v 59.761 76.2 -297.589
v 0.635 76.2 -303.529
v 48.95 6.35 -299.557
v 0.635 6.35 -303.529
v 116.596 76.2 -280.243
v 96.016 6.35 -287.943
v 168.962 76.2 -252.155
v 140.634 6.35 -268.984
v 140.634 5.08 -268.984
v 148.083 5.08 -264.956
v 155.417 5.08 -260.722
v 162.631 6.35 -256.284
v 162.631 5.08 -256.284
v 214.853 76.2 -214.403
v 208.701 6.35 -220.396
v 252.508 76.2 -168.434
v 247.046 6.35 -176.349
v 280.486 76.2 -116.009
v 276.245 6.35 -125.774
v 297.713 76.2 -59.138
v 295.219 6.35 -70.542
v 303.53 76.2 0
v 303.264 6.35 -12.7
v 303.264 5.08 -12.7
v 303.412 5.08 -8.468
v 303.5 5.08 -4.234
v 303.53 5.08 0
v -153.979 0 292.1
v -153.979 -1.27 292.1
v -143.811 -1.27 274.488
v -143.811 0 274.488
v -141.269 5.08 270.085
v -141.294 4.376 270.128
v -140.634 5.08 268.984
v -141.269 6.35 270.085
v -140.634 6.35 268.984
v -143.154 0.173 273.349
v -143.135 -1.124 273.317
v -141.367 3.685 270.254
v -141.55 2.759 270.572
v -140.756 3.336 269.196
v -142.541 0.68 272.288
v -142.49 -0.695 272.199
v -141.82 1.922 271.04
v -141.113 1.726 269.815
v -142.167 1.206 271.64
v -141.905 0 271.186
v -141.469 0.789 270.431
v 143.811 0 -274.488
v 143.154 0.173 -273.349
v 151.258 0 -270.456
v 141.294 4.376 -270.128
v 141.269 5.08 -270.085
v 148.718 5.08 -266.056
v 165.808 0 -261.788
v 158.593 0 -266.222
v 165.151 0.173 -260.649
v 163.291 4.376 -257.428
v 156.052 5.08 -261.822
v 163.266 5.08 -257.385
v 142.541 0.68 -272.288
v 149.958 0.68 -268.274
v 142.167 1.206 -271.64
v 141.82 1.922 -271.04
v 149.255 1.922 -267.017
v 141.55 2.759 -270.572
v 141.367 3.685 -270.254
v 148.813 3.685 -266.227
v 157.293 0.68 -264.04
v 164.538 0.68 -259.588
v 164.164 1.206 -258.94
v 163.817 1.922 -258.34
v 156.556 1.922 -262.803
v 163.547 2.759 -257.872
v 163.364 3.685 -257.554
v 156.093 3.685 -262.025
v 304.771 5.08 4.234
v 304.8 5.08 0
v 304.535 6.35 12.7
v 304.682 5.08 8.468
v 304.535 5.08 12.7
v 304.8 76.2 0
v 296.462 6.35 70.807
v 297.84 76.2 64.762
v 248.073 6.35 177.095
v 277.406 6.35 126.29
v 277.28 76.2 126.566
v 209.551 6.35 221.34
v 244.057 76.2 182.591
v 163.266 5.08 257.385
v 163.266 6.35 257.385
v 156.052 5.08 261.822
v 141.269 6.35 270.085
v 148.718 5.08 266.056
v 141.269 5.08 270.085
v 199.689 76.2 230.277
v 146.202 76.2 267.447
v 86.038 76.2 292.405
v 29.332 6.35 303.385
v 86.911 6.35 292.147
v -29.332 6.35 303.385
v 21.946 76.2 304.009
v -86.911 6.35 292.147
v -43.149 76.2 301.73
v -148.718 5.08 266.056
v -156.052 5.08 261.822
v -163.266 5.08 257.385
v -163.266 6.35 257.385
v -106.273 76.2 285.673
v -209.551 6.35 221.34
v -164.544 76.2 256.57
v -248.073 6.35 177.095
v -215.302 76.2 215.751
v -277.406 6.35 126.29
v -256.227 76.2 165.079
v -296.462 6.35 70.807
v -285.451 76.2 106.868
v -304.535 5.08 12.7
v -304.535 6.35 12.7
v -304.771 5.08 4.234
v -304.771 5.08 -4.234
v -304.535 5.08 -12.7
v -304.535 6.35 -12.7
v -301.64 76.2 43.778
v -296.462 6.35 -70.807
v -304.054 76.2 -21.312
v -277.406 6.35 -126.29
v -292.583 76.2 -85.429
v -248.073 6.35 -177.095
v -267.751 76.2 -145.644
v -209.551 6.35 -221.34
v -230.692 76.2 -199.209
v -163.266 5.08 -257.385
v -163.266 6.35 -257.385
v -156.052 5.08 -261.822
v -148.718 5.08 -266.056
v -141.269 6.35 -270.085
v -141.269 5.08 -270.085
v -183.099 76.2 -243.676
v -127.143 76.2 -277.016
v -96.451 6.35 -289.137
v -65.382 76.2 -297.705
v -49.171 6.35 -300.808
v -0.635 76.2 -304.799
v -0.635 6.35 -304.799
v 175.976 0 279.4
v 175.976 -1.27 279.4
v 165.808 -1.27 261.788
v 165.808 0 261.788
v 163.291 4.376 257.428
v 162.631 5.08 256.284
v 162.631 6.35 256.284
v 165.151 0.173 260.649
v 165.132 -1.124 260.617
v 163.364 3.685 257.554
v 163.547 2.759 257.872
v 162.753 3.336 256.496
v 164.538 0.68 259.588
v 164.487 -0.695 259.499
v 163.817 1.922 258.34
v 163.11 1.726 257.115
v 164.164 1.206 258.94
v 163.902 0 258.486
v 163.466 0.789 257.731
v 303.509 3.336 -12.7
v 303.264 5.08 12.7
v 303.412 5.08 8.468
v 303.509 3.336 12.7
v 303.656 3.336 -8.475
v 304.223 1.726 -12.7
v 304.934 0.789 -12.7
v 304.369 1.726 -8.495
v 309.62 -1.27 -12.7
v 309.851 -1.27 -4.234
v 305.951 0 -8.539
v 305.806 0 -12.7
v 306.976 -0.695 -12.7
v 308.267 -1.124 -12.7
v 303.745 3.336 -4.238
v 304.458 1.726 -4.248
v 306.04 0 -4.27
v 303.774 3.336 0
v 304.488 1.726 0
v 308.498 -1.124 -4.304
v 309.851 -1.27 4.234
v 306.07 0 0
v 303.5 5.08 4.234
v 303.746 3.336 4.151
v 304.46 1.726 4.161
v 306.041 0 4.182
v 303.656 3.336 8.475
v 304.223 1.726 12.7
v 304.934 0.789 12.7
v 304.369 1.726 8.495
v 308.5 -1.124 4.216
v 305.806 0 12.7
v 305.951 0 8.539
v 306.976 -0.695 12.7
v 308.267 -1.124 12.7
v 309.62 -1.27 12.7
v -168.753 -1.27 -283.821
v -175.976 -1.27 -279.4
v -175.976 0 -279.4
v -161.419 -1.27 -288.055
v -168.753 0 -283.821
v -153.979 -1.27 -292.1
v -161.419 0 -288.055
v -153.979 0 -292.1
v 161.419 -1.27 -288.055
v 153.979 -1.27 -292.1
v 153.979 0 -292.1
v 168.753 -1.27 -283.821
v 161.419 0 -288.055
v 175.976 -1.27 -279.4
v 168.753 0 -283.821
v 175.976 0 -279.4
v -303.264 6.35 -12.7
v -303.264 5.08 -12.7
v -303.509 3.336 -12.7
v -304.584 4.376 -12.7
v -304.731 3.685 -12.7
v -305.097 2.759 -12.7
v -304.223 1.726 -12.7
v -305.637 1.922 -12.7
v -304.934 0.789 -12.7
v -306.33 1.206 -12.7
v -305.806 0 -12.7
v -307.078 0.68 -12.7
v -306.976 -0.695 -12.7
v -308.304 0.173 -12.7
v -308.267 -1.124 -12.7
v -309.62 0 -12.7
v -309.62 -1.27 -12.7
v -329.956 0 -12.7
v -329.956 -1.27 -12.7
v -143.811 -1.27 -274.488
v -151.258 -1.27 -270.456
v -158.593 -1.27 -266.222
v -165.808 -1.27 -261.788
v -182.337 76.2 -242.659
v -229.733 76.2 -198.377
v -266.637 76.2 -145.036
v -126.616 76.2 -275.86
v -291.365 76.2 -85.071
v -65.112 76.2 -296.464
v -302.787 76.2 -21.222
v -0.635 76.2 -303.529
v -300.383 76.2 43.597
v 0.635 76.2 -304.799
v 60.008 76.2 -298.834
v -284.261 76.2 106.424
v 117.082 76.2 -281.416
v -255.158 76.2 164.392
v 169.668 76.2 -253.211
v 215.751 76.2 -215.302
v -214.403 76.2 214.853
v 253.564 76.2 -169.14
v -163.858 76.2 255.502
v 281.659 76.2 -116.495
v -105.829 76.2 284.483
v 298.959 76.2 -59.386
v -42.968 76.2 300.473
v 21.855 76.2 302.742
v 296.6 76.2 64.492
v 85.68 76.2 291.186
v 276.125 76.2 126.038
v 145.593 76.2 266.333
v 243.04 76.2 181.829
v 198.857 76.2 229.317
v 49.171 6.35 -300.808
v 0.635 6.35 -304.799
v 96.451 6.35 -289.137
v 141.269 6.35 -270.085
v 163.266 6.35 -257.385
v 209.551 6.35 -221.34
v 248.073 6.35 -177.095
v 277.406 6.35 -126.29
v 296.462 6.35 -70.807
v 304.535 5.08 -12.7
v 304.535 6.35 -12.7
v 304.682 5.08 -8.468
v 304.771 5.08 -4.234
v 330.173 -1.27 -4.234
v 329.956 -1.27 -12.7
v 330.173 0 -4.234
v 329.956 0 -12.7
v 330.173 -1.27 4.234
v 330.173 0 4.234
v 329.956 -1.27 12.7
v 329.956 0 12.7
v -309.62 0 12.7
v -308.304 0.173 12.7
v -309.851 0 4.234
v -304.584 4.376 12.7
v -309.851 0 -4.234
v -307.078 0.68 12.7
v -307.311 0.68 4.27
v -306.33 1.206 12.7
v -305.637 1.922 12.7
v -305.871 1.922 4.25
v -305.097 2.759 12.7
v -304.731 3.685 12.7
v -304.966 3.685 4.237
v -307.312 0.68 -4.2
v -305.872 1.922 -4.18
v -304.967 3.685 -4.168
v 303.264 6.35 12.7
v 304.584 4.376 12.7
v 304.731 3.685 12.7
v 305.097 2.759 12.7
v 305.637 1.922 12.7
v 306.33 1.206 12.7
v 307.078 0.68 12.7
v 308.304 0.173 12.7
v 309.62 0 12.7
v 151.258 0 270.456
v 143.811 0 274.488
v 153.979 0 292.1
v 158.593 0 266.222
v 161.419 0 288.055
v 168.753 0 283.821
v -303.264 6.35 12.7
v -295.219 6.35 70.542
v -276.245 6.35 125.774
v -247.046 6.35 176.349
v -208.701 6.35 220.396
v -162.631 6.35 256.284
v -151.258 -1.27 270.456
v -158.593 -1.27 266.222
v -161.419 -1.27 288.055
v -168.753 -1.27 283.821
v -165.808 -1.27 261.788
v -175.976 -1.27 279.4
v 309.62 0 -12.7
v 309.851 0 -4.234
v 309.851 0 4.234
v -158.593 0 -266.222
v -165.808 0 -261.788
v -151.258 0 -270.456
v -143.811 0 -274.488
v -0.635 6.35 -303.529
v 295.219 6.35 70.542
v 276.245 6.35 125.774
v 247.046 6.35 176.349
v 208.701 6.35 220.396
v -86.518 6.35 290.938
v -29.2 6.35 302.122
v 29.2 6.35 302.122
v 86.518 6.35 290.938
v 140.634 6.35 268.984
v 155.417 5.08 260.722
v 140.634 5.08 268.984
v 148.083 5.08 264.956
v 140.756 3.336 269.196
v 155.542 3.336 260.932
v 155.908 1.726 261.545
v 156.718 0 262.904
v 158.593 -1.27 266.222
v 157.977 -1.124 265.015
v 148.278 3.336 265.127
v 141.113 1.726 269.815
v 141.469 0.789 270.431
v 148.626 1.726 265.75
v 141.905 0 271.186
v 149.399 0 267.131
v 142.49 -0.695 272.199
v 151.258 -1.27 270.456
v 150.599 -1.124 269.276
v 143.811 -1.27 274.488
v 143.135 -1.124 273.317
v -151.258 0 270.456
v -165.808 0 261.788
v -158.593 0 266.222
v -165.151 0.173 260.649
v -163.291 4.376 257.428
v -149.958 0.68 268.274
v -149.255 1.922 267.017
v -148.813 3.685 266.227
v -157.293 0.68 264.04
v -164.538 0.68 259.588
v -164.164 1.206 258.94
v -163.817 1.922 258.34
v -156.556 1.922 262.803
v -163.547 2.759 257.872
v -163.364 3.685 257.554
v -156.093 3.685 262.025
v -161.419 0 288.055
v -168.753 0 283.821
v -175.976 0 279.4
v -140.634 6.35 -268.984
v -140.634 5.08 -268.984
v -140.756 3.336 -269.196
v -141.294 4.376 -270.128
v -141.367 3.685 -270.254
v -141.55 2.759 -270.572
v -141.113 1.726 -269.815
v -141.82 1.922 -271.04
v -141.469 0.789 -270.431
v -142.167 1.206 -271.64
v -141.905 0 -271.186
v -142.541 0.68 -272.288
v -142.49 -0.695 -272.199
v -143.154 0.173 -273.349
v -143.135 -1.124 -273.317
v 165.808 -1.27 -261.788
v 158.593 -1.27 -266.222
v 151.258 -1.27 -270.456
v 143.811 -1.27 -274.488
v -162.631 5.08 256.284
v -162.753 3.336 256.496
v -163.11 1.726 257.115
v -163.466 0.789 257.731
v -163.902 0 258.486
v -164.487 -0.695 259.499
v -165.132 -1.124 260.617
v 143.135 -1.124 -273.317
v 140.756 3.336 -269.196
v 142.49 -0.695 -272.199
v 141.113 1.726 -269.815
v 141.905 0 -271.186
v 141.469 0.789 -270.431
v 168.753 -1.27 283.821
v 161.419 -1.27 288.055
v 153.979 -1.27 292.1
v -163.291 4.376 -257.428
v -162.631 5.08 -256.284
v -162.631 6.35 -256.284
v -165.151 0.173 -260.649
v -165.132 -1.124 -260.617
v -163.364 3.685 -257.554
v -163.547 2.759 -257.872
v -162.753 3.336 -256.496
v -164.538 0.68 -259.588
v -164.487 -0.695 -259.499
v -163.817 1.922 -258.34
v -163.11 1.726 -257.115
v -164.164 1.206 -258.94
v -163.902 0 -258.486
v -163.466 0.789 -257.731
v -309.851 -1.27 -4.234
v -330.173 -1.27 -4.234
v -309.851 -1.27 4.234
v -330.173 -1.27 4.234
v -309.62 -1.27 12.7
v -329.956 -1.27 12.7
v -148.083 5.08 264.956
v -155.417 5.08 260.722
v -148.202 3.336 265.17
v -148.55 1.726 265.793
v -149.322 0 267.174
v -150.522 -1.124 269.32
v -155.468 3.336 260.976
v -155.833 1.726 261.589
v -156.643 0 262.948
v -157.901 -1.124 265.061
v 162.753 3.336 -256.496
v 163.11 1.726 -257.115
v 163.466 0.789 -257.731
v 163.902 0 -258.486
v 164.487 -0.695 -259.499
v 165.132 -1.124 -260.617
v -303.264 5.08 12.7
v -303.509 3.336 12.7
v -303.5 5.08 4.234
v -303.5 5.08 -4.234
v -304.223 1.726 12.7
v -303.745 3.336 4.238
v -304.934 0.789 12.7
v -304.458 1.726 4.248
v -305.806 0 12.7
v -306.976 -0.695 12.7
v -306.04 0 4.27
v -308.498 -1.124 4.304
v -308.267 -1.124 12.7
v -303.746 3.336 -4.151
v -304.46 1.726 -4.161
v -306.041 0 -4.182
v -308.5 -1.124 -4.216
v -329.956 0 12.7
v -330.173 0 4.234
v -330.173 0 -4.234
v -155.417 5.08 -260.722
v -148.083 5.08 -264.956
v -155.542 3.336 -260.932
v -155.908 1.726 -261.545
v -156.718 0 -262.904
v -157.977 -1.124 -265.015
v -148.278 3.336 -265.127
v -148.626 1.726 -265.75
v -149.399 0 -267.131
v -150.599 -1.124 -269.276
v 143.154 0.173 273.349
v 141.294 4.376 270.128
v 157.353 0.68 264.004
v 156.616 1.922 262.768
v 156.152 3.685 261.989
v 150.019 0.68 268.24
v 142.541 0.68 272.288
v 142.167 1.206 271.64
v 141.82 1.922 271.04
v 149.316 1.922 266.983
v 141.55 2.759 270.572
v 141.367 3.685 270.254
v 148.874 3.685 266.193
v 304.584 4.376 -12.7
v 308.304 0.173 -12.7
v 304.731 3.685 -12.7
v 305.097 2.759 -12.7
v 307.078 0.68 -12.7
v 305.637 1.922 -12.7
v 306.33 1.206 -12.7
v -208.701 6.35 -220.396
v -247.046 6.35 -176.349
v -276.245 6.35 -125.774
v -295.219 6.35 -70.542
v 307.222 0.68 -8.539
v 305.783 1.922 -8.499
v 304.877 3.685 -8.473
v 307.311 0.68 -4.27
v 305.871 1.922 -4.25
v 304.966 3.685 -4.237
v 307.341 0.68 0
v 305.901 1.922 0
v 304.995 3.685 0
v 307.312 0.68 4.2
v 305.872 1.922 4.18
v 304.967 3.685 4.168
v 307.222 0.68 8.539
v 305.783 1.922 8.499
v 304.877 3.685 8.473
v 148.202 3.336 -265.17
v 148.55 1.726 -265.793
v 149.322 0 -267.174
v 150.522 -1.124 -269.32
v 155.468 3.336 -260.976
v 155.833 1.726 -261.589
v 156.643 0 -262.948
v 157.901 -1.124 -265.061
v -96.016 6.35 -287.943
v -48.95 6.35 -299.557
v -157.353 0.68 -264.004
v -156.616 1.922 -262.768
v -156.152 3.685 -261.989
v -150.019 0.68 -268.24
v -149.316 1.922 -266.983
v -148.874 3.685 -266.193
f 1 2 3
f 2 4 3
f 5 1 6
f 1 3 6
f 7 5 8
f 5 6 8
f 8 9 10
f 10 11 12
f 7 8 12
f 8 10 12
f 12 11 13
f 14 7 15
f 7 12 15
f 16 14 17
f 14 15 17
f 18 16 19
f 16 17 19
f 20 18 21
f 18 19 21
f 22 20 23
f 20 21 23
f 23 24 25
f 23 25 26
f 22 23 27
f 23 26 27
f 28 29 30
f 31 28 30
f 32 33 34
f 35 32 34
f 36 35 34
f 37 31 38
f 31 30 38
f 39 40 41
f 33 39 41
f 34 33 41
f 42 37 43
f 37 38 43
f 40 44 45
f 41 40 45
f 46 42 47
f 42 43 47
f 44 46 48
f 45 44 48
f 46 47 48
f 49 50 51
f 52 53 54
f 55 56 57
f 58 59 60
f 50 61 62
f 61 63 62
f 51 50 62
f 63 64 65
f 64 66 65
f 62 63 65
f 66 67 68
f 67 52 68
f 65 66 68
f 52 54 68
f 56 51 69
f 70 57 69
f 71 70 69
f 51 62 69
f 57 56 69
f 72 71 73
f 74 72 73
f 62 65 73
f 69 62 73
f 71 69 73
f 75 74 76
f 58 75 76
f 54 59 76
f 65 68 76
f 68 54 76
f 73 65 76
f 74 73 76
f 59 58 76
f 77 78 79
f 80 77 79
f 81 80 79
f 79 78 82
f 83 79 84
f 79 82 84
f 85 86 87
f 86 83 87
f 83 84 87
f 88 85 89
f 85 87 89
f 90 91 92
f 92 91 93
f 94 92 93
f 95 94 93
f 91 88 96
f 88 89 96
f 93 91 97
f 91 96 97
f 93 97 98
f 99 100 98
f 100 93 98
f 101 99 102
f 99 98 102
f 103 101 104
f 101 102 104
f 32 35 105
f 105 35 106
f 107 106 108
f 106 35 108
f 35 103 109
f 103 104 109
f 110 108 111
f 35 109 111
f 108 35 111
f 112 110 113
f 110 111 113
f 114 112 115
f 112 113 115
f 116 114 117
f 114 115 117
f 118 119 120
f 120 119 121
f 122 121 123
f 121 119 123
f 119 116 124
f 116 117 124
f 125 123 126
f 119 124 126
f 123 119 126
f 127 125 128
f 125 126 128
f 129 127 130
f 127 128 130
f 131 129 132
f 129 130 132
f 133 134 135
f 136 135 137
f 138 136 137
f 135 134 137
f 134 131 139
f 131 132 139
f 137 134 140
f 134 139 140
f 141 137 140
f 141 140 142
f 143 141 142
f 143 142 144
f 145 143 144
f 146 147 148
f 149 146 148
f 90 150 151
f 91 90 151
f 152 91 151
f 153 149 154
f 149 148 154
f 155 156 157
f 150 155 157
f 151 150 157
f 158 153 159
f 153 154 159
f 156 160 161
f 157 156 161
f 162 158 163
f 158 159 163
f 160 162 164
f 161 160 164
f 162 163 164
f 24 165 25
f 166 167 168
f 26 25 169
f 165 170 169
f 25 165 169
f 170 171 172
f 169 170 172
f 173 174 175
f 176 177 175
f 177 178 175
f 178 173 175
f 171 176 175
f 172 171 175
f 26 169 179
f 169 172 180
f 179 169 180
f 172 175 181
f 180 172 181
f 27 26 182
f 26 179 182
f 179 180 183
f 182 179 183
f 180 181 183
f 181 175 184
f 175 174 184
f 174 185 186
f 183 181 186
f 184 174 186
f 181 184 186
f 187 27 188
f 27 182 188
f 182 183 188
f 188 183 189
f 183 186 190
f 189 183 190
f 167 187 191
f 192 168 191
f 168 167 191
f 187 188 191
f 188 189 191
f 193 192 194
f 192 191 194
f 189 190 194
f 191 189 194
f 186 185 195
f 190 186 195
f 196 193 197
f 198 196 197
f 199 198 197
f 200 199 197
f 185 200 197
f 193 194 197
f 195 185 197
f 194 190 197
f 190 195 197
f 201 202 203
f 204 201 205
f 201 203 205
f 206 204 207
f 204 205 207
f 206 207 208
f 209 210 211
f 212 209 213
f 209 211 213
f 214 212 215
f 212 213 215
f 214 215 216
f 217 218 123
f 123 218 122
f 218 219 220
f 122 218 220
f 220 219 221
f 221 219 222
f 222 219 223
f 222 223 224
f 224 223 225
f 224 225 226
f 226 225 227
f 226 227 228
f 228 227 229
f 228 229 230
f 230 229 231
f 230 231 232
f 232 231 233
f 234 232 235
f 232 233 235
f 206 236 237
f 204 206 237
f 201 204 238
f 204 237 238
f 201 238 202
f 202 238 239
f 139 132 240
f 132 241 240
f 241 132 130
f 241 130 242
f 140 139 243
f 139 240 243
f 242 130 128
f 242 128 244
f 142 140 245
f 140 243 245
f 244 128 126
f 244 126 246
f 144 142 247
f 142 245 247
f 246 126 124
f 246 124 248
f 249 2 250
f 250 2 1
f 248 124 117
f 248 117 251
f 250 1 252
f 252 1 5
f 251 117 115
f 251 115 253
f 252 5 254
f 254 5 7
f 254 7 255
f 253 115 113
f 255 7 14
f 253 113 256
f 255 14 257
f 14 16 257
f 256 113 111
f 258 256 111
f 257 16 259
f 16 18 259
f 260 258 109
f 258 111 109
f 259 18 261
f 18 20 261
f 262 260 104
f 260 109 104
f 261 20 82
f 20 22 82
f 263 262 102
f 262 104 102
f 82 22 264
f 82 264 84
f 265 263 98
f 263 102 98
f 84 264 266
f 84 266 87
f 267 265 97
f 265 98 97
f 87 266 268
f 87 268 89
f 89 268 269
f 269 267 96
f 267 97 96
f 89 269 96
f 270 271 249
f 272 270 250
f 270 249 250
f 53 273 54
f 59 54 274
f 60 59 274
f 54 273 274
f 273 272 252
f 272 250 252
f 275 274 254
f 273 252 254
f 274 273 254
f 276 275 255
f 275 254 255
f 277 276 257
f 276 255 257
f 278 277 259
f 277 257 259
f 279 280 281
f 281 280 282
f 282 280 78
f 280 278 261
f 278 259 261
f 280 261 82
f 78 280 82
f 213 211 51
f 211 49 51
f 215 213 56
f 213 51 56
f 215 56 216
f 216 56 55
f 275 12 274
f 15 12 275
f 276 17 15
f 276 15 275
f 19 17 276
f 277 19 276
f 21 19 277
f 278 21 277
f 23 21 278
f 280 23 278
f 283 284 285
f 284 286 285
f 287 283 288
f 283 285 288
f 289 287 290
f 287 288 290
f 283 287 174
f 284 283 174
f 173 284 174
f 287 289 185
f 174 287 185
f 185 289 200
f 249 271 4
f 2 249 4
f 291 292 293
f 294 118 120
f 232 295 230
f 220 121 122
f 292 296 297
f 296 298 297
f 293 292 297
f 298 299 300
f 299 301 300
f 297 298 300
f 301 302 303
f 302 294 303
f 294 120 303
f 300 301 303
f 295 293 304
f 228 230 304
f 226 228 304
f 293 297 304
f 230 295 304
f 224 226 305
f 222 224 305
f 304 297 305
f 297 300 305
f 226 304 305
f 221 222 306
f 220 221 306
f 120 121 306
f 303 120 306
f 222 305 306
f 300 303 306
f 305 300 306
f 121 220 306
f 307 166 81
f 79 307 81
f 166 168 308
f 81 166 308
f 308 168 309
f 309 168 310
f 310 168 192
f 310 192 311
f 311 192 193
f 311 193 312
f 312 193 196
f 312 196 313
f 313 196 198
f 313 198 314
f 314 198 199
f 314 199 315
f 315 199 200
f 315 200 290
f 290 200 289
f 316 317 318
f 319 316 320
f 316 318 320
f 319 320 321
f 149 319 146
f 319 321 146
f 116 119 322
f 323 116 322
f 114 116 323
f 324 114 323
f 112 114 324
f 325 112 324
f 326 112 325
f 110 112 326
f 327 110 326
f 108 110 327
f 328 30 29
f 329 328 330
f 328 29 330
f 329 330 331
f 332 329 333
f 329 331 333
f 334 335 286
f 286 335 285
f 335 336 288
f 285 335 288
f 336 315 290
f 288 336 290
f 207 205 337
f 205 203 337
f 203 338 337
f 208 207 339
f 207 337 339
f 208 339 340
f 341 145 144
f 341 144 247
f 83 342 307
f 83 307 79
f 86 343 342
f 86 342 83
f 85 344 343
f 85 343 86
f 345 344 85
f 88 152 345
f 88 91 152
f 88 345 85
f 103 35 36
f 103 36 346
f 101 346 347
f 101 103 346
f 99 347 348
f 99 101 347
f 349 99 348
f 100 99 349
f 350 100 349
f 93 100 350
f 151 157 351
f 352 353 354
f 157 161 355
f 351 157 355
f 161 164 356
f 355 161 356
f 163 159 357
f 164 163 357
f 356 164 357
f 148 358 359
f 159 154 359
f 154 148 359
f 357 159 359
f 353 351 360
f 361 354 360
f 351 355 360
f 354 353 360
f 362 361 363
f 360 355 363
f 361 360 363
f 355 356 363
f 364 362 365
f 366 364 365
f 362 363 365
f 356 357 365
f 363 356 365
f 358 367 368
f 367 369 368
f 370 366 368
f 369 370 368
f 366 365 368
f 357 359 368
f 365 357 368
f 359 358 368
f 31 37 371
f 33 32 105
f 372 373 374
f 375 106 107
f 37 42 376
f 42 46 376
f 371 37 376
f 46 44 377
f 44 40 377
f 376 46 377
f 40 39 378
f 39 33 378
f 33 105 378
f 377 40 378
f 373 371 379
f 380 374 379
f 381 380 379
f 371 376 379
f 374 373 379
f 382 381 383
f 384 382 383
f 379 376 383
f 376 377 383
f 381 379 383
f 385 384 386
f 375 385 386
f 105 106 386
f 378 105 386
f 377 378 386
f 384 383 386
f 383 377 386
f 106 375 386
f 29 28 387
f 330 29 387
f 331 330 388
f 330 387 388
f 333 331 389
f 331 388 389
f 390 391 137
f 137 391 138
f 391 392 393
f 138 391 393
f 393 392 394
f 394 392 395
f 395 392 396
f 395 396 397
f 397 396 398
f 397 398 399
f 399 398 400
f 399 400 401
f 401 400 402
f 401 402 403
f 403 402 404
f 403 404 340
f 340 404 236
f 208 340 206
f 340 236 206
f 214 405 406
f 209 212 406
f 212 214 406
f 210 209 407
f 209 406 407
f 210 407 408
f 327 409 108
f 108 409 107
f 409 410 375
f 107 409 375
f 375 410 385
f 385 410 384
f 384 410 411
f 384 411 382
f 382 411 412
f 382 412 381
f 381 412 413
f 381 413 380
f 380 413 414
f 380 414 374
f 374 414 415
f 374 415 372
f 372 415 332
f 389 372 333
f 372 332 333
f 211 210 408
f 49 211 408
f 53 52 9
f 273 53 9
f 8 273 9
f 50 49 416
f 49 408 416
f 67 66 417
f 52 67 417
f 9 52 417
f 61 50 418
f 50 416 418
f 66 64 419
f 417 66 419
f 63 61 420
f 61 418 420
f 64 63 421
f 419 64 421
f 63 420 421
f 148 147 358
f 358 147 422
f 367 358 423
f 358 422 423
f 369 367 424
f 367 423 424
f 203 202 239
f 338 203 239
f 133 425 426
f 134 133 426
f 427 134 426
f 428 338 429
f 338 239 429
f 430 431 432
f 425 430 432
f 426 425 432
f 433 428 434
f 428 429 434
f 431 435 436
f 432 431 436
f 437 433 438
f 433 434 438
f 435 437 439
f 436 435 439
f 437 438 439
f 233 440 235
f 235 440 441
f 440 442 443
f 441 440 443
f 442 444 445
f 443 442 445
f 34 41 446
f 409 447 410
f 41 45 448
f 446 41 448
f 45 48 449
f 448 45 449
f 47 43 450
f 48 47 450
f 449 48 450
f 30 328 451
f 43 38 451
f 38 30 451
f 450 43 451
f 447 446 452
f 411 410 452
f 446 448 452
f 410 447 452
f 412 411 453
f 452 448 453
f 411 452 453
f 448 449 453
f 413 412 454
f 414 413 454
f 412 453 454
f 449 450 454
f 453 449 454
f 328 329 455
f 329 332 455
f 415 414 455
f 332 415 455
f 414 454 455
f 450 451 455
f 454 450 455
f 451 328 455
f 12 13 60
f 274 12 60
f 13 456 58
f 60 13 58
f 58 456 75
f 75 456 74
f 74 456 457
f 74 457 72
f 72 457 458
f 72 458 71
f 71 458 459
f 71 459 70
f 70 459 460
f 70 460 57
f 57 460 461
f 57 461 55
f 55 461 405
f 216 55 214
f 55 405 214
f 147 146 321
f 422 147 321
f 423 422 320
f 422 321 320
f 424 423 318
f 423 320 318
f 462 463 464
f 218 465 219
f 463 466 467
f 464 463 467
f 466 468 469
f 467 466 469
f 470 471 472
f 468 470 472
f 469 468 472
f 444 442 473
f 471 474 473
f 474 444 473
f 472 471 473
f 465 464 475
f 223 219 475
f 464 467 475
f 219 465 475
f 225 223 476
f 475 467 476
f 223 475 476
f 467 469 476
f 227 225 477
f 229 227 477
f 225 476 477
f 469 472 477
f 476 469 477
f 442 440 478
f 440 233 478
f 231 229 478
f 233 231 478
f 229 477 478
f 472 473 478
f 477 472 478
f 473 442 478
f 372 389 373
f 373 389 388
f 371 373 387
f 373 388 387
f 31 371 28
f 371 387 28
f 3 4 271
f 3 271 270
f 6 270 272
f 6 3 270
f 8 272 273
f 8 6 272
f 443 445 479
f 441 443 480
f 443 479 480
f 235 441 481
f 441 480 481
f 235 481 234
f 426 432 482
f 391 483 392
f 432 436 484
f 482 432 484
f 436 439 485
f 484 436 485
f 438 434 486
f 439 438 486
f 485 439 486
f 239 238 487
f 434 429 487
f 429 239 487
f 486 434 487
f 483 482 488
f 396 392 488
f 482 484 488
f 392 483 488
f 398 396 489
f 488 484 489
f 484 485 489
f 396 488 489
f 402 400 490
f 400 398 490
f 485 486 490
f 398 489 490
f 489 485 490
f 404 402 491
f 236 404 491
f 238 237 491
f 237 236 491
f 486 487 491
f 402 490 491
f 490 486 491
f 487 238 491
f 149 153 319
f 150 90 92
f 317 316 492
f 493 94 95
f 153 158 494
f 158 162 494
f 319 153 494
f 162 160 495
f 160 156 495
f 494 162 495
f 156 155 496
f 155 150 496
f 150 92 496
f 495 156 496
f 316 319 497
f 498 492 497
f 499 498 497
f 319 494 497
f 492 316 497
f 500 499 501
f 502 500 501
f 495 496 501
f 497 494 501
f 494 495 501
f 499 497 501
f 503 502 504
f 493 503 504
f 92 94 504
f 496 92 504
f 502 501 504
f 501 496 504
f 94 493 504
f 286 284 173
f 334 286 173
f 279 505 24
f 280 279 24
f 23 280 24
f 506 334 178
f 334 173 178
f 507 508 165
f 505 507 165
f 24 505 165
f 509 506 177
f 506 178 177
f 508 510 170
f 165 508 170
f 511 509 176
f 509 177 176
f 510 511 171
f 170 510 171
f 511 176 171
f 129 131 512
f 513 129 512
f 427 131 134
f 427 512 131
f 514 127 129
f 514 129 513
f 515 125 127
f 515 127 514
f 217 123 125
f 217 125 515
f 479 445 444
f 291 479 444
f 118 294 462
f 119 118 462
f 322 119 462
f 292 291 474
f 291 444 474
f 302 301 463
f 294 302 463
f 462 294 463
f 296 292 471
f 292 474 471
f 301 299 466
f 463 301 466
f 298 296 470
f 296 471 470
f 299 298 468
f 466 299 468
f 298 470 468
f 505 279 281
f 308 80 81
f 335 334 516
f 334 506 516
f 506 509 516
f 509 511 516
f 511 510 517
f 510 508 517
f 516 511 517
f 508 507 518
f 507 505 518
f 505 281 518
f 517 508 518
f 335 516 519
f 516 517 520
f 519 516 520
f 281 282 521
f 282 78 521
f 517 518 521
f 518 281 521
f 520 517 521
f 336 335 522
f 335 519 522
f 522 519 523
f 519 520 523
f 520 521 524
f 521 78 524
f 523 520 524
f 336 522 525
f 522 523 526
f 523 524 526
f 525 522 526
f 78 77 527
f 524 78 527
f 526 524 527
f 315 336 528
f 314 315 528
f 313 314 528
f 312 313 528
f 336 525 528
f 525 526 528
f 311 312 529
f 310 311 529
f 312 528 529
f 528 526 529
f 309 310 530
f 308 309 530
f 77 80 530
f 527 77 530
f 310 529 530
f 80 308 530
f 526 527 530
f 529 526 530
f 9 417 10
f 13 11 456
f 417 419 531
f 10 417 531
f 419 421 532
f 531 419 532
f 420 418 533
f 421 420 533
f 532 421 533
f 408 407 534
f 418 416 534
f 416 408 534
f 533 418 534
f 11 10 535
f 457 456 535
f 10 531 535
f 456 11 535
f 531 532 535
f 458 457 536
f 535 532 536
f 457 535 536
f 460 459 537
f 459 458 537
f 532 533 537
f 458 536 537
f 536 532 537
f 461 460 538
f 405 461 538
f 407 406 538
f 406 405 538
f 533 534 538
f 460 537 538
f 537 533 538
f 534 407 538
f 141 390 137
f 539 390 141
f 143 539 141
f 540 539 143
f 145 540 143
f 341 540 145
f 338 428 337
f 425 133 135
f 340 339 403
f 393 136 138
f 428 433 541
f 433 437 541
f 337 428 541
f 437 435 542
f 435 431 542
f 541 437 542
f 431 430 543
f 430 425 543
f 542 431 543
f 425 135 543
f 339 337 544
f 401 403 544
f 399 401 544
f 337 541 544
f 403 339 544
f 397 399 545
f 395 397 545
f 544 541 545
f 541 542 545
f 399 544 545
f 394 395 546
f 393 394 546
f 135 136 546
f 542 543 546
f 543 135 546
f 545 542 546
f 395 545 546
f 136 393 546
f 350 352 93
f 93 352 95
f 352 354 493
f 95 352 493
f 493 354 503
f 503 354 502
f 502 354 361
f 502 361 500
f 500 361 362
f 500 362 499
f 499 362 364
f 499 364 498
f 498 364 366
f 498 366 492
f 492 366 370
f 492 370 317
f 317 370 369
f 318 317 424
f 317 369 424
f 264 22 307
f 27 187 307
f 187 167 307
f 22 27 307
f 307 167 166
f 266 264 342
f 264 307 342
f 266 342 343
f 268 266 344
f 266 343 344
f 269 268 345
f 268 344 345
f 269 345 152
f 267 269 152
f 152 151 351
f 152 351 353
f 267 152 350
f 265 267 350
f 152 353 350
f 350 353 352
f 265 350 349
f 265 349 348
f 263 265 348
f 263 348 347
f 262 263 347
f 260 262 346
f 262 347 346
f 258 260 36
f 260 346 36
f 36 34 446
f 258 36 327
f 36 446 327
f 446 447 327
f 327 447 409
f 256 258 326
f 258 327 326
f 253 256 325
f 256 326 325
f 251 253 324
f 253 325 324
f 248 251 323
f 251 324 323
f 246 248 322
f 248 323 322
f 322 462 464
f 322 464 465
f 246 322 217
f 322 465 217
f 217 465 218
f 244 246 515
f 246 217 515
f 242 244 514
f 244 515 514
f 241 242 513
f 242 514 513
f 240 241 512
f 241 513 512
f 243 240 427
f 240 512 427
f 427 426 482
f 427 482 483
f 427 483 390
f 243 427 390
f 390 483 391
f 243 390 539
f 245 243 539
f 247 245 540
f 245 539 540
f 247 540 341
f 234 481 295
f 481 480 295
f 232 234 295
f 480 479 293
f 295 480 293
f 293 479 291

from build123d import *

# Parameters (mm, degrees)
F3_DEPTH      = 6.35
F3_DEPTH_BACK = 1.271
F4_W          = 1.27
F4_H          = 76.2
F5_DEPTH      = 76.201
F5_DEPTH_BACK = 1.2710001


with BuildPart() as f1:
    # F0 (on Top) → F1 (revolve)
    with BuildSketch(Plane.XY):
        with BuildLine():
            Line((304.8, 5.08), (304.8, 76.2))
            Line((304.8, 76.2), (303.53, 76.2))
            Line((303.53, 76.2), (303.53, 5.08))
            ThreePointArc((303.53, 5.08), (305.3898719395, 0.5898719395), (309.88, -1.27))
            Line((309.88, -1.27), (330.2, -1.27))
            Line((330.2, -1.27), (330.2, 0))
            Line((330.2, 0), (309.88, 0))
            ThreePointArc((309.88, 0), (306.2878975516, 1.4878975516), (304.8, 5.08))
        make_face()
    revolve(axis=Axis((0, 33.4558707156, 0), (0, -1, 0)))

    # F2 (on Front) → F3 (cut, two sides)
    with BuildSketch(Plane.XZ) as f3_sk:
        with BuildLine():
            Line((162.6306192468, -256.2844954019), (175.976362049, -279.4))
            ThreePointArc((175.976362049, -279.4), (285.9615883296, -165.1), (329.9556788419, -12.7))
            Line((329.9556788419, -12.7), (303.2641932375, -12.7))
            ThreePointArc((303.2641932375, -12.7), (262.8646908107, -151.765), (162.6306192468, -256.2844954019))
        make_face()
        with BuildLine():
            Line((303.2641932375, 12.7), (329.9556788419, 12.7))
            ThreePointArc((329.9556788419, 12.7), (285.9615883296, 165.1), (175.976362049, 279.4))
            Line((175.976362049, 279.4), (162.6306192468, 256.2844954019))
            ThreePointArc((162.6306192468, 256.2844954019), (262.8646908107, 151.765), (303.2641932375, 12.7))
        make_face()
        with BuildLine():
            ThreePointArc((-140.6335739907, 268.9844954019), (0, 303.53), (140.6335739907, 268.9844954019))
            Line((140.6335739907, 268.9844954019), (153.9793167929, 292.1))
            ThreePointArc((153.9793167929, 292.1), (0, 330.2), (-153.9793167929, 292.1))
            Line((-153.9793167929, 292.1), (-140.6335739907, 268.9844954019))
        make_face()
        with BuildLine():
            Line((-329.9556788419, 12.7), (-303.2641932375, 12.7))
            ThreePointArc((-303.2641932375, 12.7), (-262.8646908107, 151.765), (-162.6306192468, 256.2844954019))
            Line((-162.6306192468, 256.2844954019), (-175.976362049, 279.4))
            ThreePointArc((-175.976362049, 279.4), (-285.9615883296, 165.1), (-329.9556788419, 12.7))
        make_face()
        with BuildLine():
            Line((-175.976362049, -279.4), (-162.6306192468, -256.2844954019))
            ThreePointArc((-162.6306192468, -256.2844954019), (-262.8646908107, -151.765), (-303.2641932375, -12.7))
            Line((-303.2641932375, -12.7), (-329.9556788419, -12.7))
            ThreePointArc((-329.9556788419, -12.7), (-285.9615883296, -165.1), (-175.976362049, -279.4))
        make_face()
        with BuildLine():
            ThreePointArc((-153.9793167929, -292.1), (0, -330.2), (153.9793167929, -292.1))
            Line((153.9793167929, -292.1), (140.6335739907, -268.9844954019))
            ThreePointArc((140.6335739907, -268.9844954019), (0, -303.53), (-140.6335739907, -268.9844954019))
            Line((-140.6335739907, -268.9844954019), (-153.9793167929, -292.1))
        make_face()
    extrude(amount=-F3_DEPTH, mode=Mode.SUBTRACT)
    extrude(f3_sk.sketch, amount=F3_DEPTH_BACK, mode=Mode.SUBTRACT)

    # F4 (on Front) → F5 (cut, two sides)
    with BuildSketch(Plane.XZ) as f5_sk:
        with Locations((0, -319.9747502804)):
            Rectangle(F4_W, F4_H)
    extrude(amount=-F5_DEPTH, mode=Mode.SUBTRACT)
    extrude(f5_sk.sketch, amount=F5_DEPTH_BACK, mode=Mode.SUBTRACT)


solid = f1.part
